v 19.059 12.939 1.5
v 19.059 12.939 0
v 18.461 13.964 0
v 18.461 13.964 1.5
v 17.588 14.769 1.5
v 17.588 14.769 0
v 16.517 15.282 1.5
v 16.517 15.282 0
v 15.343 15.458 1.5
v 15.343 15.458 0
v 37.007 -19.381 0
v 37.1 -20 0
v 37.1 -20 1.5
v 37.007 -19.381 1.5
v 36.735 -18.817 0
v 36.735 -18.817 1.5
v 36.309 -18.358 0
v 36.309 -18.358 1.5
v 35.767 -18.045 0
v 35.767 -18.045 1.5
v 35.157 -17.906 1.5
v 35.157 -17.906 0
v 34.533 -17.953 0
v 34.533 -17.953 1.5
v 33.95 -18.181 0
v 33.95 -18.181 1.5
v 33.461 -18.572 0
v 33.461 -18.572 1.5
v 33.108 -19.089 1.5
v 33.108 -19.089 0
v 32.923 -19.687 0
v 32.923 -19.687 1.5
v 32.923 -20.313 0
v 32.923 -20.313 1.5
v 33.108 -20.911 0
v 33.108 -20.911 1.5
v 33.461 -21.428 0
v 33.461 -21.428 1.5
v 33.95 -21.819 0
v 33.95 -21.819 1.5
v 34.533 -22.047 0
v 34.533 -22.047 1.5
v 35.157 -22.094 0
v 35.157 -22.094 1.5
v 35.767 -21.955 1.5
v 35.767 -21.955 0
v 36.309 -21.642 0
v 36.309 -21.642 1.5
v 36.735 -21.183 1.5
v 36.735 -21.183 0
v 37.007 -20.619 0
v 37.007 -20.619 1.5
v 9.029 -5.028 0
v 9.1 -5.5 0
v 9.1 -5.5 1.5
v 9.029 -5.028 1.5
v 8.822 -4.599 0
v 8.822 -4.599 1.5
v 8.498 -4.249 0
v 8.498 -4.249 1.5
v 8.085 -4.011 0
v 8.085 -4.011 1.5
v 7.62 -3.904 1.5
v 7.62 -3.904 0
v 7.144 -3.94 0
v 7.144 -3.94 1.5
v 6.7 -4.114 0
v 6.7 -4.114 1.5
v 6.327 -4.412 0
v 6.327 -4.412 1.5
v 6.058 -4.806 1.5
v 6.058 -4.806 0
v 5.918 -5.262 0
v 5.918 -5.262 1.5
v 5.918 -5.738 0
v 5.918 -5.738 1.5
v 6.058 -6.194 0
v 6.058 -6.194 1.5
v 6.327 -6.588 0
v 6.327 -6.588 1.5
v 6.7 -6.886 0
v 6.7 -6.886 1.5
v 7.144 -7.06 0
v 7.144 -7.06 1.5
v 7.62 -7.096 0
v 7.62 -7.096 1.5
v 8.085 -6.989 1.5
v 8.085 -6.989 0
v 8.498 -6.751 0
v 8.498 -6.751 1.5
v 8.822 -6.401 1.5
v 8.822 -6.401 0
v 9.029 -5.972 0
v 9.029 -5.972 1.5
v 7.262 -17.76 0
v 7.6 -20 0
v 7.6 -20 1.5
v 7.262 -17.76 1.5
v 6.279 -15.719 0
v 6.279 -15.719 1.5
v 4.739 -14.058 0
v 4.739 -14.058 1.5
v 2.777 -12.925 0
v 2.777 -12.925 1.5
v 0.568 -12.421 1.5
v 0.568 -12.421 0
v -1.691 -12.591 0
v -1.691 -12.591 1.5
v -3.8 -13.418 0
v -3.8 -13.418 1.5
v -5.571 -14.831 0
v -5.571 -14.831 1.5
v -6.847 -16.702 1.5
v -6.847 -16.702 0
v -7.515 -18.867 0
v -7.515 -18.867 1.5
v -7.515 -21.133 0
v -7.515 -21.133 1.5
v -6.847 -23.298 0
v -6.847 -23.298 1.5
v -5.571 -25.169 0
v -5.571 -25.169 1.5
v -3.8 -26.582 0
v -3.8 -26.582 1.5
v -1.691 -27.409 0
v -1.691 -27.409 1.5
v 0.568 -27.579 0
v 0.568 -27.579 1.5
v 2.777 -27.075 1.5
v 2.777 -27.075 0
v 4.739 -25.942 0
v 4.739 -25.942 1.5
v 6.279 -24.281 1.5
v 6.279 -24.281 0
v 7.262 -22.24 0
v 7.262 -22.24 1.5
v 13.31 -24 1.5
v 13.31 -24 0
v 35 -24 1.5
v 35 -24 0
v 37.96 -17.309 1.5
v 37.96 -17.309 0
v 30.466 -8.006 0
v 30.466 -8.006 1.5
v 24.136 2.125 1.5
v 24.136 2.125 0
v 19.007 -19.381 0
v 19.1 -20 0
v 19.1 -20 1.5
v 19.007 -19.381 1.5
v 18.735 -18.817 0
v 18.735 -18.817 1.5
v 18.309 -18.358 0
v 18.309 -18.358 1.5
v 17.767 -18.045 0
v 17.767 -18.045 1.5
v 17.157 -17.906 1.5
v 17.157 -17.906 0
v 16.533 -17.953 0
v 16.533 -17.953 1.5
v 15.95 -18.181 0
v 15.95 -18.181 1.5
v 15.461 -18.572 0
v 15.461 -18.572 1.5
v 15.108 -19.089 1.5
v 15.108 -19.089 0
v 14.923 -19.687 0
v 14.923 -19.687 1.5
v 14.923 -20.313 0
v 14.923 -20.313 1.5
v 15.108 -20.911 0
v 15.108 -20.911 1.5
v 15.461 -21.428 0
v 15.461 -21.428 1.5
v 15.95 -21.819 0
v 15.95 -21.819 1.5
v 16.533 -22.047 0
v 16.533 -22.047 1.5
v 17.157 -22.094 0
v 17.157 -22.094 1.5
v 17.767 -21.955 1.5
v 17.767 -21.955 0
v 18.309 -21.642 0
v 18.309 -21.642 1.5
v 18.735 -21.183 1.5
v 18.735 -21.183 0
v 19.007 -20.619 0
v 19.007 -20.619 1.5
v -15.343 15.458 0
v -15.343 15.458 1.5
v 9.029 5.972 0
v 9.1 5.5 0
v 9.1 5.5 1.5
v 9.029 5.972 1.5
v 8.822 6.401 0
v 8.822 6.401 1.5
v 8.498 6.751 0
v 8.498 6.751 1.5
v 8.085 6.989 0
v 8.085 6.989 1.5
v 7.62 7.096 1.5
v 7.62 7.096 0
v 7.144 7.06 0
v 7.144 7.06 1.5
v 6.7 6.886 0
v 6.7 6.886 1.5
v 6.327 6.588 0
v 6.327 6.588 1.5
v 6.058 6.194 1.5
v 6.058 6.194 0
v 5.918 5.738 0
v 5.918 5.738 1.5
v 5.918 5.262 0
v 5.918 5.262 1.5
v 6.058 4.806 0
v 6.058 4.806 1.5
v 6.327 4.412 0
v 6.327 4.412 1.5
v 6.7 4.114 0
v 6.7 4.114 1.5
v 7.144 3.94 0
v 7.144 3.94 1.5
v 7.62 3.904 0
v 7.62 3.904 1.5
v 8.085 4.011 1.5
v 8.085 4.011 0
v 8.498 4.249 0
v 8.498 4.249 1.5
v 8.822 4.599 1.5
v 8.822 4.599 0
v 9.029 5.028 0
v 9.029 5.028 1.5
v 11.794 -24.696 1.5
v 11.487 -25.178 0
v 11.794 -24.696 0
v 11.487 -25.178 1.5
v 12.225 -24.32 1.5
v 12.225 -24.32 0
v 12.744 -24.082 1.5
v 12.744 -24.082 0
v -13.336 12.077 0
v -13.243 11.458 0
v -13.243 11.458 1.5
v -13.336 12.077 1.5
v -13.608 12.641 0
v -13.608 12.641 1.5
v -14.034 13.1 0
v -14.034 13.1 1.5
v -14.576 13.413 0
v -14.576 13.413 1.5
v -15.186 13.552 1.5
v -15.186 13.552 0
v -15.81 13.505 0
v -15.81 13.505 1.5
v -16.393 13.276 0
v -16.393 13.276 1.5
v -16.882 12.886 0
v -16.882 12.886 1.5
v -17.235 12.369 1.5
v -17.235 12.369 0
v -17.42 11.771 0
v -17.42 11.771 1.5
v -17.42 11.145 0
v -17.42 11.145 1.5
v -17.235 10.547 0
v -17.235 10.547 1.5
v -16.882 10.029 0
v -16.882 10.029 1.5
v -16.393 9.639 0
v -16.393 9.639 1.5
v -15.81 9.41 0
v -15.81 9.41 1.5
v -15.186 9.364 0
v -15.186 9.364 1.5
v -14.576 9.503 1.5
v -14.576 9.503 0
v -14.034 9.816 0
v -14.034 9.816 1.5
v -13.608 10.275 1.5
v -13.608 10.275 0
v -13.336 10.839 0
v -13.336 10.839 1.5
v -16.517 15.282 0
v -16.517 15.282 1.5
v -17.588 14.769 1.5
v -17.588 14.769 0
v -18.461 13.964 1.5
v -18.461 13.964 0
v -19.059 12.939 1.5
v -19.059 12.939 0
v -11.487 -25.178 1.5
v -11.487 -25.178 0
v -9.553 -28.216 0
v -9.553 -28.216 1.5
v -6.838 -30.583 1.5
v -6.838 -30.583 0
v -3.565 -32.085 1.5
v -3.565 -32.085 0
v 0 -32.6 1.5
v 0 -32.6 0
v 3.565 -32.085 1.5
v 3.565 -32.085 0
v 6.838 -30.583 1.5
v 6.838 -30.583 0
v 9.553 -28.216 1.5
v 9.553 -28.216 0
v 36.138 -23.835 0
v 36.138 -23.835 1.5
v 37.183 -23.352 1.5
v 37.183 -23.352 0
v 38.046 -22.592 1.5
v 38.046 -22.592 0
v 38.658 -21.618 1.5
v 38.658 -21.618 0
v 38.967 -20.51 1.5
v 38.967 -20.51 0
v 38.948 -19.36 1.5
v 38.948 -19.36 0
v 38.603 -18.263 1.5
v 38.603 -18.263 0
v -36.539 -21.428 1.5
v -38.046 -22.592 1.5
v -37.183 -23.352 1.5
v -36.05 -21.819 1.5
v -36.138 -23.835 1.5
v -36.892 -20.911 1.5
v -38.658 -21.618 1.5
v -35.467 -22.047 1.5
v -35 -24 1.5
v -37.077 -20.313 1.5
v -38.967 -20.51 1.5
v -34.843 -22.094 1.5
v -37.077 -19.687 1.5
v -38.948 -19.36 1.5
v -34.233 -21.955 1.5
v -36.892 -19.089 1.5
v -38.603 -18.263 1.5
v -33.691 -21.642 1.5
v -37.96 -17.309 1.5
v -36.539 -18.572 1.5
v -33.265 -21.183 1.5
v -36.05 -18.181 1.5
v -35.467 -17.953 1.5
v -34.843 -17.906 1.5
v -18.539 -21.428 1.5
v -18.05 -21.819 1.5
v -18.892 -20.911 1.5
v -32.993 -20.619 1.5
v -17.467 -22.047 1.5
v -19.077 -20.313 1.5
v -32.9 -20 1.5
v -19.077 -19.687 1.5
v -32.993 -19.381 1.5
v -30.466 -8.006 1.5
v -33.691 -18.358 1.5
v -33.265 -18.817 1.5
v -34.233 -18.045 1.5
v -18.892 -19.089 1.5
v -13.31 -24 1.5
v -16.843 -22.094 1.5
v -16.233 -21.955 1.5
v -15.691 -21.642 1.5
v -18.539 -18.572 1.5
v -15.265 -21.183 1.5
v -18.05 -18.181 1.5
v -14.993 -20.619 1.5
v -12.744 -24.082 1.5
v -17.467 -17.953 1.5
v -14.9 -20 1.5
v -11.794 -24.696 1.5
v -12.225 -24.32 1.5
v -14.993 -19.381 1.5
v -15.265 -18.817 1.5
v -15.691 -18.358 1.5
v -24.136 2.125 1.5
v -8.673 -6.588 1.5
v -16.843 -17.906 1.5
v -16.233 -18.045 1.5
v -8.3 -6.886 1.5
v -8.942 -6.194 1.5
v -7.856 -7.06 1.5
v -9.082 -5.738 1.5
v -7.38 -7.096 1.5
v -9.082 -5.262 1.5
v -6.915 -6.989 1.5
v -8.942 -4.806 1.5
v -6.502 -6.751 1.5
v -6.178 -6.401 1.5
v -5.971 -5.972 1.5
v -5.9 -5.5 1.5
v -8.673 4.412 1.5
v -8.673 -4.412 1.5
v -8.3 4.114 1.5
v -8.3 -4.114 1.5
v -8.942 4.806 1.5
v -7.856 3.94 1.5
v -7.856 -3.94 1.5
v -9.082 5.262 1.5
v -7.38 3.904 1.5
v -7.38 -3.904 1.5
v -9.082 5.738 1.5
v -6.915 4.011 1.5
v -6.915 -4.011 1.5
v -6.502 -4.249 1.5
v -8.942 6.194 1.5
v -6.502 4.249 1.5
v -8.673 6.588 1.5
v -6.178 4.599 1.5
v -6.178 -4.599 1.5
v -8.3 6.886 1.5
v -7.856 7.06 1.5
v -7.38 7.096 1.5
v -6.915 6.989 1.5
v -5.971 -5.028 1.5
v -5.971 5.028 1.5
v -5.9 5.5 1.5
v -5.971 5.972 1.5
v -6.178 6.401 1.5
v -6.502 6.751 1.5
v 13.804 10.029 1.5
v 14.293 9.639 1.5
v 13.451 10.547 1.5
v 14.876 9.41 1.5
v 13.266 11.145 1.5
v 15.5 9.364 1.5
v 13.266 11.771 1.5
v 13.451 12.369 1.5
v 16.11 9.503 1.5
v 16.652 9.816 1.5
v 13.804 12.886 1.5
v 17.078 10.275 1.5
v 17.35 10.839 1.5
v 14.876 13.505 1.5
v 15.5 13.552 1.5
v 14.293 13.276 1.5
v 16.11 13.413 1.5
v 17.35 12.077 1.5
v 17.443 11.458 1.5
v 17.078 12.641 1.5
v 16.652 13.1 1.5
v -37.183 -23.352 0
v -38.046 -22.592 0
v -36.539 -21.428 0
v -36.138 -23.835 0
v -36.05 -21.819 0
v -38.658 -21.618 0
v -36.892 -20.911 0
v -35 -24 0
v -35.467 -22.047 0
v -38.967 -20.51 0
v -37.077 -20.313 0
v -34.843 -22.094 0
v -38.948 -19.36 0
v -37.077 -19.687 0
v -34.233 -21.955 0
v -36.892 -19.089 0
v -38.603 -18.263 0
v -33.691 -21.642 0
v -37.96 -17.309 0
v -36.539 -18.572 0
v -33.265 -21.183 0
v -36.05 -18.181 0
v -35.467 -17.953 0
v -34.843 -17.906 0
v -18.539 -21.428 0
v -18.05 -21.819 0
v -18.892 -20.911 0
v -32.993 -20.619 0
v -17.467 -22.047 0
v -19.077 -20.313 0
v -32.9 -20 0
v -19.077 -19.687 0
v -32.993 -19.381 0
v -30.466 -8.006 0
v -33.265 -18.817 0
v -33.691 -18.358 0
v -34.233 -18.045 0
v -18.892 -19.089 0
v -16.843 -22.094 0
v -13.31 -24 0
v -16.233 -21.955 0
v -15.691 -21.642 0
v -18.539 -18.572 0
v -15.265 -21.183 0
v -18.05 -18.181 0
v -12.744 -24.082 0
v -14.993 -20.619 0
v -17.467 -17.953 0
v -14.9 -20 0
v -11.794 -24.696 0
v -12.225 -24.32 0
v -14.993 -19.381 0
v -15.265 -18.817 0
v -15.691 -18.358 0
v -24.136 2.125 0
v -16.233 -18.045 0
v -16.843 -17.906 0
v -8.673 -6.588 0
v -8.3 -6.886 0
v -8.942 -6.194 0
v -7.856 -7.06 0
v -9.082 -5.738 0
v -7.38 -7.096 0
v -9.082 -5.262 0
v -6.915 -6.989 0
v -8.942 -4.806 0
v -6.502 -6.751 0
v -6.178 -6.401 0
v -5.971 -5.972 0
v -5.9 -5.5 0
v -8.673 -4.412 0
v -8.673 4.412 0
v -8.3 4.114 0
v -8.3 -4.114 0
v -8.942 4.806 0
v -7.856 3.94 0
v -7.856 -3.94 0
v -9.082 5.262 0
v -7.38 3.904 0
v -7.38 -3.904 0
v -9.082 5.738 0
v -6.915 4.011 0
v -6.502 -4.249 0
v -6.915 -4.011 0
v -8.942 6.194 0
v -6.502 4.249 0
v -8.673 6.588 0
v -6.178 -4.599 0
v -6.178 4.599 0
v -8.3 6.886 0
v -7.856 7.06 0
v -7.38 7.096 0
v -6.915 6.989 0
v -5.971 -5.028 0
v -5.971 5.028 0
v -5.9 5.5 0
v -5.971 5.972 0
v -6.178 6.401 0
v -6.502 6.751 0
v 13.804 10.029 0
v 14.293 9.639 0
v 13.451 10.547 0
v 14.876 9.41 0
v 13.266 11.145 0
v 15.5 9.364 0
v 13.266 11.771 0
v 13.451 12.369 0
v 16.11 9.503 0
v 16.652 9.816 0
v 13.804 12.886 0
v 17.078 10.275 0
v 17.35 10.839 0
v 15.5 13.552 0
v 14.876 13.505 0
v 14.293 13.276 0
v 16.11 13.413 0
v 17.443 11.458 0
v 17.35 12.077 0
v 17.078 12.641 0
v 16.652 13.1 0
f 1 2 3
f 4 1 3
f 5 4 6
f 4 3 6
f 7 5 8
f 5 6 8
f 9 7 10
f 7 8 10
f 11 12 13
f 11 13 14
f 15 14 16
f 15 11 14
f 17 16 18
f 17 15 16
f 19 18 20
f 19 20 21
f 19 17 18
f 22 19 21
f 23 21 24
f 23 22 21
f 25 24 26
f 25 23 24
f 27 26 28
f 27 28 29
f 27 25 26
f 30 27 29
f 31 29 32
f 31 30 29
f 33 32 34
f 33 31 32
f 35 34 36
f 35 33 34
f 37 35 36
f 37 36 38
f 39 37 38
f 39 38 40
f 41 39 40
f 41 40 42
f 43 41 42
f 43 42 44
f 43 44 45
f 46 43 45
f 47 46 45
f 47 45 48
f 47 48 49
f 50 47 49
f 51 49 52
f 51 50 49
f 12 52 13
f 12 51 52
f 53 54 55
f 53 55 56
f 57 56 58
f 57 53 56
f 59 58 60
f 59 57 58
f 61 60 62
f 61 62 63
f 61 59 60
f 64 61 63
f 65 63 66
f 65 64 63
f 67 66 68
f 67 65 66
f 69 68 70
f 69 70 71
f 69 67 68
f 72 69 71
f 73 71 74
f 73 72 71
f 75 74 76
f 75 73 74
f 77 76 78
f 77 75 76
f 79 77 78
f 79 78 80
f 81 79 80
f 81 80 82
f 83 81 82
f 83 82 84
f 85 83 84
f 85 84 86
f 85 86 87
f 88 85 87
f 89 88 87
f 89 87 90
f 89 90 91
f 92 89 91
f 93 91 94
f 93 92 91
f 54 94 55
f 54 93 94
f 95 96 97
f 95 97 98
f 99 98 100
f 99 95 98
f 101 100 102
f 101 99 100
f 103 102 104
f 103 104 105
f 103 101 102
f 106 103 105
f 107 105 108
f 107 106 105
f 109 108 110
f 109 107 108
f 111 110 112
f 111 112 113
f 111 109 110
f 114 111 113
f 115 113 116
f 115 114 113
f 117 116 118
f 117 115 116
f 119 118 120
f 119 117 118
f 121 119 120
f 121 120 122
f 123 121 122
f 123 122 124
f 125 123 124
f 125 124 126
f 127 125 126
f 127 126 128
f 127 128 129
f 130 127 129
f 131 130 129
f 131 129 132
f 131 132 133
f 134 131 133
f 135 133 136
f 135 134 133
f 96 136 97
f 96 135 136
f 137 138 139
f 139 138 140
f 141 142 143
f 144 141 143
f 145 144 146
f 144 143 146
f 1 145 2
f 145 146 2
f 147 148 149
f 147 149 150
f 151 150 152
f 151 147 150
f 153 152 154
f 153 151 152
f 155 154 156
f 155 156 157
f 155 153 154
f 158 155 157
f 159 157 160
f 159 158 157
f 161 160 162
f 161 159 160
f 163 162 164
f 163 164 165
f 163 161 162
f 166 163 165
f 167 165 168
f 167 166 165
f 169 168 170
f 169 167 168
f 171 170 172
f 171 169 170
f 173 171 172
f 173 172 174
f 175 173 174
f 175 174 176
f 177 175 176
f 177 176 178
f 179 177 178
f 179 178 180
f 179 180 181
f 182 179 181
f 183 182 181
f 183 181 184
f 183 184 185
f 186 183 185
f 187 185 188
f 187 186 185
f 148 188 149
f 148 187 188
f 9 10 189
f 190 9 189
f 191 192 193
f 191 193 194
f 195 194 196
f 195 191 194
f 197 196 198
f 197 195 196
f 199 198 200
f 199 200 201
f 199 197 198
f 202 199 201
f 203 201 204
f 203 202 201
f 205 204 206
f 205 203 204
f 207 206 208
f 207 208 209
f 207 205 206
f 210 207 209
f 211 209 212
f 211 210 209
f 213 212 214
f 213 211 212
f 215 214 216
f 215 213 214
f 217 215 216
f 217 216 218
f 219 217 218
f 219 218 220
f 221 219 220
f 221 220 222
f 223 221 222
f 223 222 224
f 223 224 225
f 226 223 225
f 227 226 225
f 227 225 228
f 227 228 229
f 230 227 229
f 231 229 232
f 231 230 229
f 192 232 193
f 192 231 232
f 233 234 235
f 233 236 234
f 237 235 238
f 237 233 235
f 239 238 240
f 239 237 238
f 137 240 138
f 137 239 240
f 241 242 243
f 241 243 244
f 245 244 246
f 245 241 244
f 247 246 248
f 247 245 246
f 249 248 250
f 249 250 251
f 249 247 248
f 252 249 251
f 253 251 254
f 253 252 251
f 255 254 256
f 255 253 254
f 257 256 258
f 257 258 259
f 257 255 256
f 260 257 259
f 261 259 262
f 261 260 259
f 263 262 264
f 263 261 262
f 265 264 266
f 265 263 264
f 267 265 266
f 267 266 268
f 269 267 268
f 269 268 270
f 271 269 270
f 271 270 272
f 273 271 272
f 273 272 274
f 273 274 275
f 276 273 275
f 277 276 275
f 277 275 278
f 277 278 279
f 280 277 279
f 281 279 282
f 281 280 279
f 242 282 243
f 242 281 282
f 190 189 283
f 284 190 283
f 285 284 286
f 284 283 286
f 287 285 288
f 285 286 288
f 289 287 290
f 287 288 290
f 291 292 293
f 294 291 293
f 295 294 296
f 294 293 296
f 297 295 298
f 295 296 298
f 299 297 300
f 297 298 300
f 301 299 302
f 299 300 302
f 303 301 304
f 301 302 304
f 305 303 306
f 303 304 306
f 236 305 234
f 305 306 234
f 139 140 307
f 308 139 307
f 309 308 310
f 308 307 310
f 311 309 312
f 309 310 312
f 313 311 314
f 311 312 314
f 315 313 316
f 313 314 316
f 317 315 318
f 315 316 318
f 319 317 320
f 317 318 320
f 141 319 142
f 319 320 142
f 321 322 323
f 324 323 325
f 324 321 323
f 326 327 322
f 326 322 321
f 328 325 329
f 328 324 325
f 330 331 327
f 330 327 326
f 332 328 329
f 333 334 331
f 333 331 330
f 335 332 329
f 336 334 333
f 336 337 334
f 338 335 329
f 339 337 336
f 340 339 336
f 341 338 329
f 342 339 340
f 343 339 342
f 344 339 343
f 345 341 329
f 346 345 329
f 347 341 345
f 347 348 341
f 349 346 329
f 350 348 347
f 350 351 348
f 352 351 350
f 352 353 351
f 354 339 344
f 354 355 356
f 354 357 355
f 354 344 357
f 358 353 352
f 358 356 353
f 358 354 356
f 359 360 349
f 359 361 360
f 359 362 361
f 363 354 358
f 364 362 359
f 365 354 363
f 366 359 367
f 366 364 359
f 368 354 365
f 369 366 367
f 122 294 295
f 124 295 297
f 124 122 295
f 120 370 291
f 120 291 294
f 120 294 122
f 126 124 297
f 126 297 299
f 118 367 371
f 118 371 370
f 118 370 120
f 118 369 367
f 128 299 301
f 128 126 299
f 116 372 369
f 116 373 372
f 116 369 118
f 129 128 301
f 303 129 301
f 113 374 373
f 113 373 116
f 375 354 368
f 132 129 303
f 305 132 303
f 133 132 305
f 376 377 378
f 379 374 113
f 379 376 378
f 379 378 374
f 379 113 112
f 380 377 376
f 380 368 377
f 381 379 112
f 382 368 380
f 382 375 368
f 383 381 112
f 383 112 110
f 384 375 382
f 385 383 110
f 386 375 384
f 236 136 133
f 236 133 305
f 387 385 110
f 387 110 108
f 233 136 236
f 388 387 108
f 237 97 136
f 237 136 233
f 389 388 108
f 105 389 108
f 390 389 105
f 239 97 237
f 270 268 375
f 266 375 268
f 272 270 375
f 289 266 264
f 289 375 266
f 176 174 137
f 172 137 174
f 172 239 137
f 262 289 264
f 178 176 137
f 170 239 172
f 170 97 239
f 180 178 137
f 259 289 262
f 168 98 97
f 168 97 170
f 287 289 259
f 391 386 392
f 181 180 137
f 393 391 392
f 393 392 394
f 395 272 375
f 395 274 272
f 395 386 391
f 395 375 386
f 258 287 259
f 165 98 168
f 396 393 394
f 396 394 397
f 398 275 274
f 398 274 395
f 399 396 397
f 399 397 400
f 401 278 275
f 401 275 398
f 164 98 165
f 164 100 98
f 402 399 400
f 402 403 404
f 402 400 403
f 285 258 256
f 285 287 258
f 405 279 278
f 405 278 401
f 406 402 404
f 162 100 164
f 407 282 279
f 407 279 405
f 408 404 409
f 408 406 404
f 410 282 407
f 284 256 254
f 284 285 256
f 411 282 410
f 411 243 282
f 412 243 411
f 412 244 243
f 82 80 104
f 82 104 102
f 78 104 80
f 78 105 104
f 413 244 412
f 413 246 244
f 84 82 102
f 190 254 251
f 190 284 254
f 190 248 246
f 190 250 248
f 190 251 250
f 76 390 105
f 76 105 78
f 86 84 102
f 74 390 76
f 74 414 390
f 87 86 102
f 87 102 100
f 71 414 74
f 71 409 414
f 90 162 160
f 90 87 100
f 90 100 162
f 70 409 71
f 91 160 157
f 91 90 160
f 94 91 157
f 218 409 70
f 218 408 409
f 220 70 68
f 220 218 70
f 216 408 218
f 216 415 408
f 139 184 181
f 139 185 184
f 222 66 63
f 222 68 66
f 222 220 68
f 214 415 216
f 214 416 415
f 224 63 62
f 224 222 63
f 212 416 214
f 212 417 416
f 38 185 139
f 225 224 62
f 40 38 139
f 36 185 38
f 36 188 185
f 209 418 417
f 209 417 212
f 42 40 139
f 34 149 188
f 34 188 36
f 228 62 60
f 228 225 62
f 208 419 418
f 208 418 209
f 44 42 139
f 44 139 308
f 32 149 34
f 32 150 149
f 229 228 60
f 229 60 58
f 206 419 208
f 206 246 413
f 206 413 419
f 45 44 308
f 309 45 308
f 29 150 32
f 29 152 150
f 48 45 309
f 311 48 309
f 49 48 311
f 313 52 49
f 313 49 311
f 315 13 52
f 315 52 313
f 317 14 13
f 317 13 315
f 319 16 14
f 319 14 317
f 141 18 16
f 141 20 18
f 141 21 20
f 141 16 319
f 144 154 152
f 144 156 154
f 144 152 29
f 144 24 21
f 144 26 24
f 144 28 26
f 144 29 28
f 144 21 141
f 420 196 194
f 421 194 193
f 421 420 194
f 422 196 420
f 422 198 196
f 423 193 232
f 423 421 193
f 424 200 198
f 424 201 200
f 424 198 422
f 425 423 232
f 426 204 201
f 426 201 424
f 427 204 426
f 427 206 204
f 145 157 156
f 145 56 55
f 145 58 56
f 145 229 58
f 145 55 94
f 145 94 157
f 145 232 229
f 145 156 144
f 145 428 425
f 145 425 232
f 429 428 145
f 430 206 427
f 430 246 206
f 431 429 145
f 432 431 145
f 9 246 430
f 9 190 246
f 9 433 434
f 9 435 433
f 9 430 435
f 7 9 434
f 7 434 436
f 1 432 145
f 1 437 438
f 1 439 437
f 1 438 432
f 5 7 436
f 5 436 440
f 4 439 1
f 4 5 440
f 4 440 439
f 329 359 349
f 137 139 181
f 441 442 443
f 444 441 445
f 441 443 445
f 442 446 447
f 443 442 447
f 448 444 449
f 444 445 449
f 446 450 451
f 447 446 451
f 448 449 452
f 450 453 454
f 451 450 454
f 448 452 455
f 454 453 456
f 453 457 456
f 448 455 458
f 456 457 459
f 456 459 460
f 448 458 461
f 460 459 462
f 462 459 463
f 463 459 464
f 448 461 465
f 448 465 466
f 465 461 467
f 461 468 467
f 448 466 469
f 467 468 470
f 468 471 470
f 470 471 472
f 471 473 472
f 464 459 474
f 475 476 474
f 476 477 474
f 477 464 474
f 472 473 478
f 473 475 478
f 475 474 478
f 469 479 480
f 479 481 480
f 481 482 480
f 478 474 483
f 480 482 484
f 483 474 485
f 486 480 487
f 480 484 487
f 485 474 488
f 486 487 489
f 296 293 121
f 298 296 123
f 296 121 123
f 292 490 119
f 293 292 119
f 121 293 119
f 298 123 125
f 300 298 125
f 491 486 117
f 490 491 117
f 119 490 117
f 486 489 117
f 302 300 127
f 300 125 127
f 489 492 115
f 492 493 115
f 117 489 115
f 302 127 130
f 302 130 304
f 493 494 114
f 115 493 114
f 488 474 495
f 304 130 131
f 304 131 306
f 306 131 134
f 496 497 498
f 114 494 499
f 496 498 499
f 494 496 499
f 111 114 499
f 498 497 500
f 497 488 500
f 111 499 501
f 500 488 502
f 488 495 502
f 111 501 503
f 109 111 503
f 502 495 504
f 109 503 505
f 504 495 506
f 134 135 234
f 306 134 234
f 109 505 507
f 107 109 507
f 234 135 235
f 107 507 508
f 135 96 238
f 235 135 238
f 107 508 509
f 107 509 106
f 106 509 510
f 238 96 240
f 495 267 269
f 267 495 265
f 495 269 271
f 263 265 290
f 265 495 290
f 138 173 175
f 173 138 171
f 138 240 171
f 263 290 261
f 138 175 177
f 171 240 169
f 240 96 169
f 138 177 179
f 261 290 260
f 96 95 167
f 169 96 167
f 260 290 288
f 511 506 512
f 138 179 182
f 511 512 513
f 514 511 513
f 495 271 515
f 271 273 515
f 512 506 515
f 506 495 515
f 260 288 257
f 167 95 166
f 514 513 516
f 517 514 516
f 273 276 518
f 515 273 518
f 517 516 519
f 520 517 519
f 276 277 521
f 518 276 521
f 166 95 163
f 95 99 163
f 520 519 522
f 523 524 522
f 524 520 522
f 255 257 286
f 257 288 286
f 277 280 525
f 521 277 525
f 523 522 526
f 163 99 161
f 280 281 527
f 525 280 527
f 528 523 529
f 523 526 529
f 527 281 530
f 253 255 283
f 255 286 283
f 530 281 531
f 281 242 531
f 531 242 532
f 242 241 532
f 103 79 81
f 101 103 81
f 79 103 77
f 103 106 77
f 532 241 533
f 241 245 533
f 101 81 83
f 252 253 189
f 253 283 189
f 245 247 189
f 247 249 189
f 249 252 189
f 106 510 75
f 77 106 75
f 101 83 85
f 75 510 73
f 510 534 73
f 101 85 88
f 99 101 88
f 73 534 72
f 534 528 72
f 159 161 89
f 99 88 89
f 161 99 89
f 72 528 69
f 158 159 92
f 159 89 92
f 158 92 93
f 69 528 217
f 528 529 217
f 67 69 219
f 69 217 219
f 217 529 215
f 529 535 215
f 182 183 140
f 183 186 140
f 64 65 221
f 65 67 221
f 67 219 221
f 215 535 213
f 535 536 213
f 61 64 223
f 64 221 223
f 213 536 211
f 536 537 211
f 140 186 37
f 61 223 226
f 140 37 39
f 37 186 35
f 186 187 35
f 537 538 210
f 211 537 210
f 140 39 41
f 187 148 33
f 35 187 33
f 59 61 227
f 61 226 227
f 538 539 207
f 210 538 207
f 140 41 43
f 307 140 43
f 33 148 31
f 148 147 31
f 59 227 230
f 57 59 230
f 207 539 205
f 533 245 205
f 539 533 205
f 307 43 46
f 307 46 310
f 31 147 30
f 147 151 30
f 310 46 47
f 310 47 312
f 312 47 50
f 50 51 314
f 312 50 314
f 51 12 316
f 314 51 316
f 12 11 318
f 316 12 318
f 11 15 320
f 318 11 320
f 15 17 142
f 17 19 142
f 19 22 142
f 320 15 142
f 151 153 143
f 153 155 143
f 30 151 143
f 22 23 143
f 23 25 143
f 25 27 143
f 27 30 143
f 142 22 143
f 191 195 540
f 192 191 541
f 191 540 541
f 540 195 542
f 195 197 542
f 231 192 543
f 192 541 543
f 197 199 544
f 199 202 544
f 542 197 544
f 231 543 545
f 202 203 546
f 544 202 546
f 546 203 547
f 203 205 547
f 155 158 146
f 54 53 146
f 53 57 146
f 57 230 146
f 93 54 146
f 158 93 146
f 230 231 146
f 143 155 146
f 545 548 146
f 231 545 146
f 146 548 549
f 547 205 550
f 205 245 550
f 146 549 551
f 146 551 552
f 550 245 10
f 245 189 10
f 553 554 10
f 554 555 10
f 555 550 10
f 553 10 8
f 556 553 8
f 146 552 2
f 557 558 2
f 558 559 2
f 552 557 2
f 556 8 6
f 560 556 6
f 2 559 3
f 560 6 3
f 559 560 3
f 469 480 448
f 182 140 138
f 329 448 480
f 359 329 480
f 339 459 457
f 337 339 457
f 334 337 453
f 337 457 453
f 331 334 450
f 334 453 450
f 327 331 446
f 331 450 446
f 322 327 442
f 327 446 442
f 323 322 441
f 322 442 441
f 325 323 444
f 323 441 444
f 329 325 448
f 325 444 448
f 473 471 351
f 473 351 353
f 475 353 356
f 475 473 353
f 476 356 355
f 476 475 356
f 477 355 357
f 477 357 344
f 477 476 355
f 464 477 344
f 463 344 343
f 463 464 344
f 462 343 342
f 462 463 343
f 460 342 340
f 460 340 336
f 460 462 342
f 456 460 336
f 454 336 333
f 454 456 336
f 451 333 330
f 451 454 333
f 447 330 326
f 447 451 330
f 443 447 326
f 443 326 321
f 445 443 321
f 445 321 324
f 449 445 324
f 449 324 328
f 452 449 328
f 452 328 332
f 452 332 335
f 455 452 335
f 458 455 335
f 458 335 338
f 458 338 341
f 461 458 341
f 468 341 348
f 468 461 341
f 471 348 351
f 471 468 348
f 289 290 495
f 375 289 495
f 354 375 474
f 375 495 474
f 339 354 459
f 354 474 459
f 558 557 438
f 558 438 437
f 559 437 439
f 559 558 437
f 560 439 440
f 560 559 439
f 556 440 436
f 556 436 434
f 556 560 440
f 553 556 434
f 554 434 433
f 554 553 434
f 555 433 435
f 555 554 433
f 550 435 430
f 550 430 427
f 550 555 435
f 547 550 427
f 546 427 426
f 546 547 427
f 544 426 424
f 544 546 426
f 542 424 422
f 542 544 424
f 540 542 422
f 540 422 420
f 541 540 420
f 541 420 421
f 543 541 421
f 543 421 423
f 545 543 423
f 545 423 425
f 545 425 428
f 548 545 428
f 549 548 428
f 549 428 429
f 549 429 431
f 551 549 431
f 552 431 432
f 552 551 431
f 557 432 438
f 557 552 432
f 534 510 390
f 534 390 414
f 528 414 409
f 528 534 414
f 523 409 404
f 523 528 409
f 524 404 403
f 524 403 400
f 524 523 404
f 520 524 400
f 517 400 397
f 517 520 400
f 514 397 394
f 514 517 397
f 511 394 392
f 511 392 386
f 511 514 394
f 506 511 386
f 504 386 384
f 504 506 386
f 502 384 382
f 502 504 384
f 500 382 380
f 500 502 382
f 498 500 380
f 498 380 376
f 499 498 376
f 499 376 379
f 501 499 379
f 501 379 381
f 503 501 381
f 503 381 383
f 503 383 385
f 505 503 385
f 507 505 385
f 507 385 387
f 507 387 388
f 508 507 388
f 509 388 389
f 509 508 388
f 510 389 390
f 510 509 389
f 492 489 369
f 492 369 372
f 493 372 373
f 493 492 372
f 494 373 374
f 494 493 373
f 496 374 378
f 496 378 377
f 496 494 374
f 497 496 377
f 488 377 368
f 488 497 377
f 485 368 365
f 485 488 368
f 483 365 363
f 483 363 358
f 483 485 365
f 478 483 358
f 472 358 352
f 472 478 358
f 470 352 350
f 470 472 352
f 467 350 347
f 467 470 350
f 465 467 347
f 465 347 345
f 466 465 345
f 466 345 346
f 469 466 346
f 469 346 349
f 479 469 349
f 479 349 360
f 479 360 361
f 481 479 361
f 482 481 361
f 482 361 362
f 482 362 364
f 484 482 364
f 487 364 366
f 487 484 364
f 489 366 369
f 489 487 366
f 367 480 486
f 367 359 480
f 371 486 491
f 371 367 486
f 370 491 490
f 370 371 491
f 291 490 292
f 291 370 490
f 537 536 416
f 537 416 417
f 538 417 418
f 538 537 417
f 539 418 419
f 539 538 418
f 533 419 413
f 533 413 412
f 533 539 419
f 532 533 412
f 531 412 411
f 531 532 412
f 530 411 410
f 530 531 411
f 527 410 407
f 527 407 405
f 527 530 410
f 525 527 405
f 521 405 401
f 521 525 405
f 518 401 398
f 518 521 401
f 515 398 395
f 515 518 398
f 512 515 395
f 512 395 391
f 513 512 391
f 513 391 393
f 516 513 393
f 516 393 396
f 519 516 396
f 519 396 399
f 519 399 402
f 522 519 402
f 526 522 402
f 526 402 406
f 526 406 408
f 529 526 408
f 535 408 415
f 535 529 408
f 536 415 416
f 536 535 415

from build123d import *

# Parameters (mm, degrees)
SKETCH_1_R      = 7.6
SKETCH_1_R_2    = 2.1
SKETCH_1_R_3    = 1.6
EXTRUDE_1_DEPTH = 1.5
FILLET_2_R      = 2


with BuildPart() as part:
    # ｽｹｯﾁ1 → ﾎﾞｽ - 押し出し1 (new body)
    with BuildSketch(Plane.XY):
        with BuildLine():
            ThreePointArc((-37.95979357, -17.309345429), (-38.658047176, -21.61823696), (-35, -24))
            Line((-35, -24), (-11.948221625, -24))
            ThreePointArc((-11.948221625, -24), (0, -32.6), (11.948221625, -24))
            Line((11.948221625, -24), (35, -24))
            ThreePointArc((35, -24), (38.658047176, -21.61823696), (37.95979357, -17.309345429))
            ThreePointArc((37.95979357, -17.309345429), (27.149823207, -3.034907568), (19.058822549, 12.938531129))
            ThreePointArc((19.058822549, 12.938531129), (17.587655142, 14.768604061), (15.342990138, 15.45779162))
            Line((15.342990138, 15.45779162), (-15.342990138, 15.45779162))
            ThreePointArc((-15.342990138, 15.45779162), (-17.587655142, 14.768604061), (-19.058822549, 12.938531129))
            ThreePointArc((-19.058822549, 12.938531129), (-27.149823207, -3.034907568), (-37.95979357, -17.309345429))
        make_face()
        with Locations((0, -20)):
            Circle(SKETCH_1_R, mode=Mode.SUBTRACT)
        with Locations((-35, -20)):
            Circle(SKETCH_1_R_2, mode=Mode.SUBTRACT)
        with Locations((-17, -20)):
            Circle(SKETCH_1_R_2, mode=Mode.SUBTRACT)
        with Locations((-7.5, -5.5)):
            Circle(SKETCH_1_R_3, mode=Mode.SUBTRACT)
        with Locations((17, -20)):
            Circle(SKETCH_1_R_2, mode=Mode.SUBTRACT)
        with Locations((35, -20)):
            Circle(SKETCH_1_R_2, mode=Mode.SUBTRACT)
        with Locations((7.5, -5.5)):
            Circle(SKETCH_1_R_3, mode=Mode.SUBTRACT)
        with Locations((-7.5, 5.5)):
            Circle(SKETCH_1_R_3, mode=Mode.SUBTRACT)
        with Locations((-15.342990138, 11.45779162)):
            Circle(SKETCH_1_R_2, mode=Mode.SUBTRACT)
        with Locations((7.5, 5.5)):
            Circle(SKETCH_1_R_3, mode=Mode.SUBTRACT)
        with Locations((15.342990138, 11.45779162)):
            Circle(SKETCH_1_R_2, mode=Mode.SUBTRACT)
    extrude(amount=EXTRUDE_1_DEPTH)

    # ﾌｨﾚｯﾄ2
    fillet_2_edges = [part.edges().sort_by_distance(p)[0] for p in [
        (-11.948221625, -24, 0.75),
        (11.948221625, -24, 0.75),
    ]]
    fillet(fillet_2_edges, radius=FILLET_2_R)


solid = part.part
